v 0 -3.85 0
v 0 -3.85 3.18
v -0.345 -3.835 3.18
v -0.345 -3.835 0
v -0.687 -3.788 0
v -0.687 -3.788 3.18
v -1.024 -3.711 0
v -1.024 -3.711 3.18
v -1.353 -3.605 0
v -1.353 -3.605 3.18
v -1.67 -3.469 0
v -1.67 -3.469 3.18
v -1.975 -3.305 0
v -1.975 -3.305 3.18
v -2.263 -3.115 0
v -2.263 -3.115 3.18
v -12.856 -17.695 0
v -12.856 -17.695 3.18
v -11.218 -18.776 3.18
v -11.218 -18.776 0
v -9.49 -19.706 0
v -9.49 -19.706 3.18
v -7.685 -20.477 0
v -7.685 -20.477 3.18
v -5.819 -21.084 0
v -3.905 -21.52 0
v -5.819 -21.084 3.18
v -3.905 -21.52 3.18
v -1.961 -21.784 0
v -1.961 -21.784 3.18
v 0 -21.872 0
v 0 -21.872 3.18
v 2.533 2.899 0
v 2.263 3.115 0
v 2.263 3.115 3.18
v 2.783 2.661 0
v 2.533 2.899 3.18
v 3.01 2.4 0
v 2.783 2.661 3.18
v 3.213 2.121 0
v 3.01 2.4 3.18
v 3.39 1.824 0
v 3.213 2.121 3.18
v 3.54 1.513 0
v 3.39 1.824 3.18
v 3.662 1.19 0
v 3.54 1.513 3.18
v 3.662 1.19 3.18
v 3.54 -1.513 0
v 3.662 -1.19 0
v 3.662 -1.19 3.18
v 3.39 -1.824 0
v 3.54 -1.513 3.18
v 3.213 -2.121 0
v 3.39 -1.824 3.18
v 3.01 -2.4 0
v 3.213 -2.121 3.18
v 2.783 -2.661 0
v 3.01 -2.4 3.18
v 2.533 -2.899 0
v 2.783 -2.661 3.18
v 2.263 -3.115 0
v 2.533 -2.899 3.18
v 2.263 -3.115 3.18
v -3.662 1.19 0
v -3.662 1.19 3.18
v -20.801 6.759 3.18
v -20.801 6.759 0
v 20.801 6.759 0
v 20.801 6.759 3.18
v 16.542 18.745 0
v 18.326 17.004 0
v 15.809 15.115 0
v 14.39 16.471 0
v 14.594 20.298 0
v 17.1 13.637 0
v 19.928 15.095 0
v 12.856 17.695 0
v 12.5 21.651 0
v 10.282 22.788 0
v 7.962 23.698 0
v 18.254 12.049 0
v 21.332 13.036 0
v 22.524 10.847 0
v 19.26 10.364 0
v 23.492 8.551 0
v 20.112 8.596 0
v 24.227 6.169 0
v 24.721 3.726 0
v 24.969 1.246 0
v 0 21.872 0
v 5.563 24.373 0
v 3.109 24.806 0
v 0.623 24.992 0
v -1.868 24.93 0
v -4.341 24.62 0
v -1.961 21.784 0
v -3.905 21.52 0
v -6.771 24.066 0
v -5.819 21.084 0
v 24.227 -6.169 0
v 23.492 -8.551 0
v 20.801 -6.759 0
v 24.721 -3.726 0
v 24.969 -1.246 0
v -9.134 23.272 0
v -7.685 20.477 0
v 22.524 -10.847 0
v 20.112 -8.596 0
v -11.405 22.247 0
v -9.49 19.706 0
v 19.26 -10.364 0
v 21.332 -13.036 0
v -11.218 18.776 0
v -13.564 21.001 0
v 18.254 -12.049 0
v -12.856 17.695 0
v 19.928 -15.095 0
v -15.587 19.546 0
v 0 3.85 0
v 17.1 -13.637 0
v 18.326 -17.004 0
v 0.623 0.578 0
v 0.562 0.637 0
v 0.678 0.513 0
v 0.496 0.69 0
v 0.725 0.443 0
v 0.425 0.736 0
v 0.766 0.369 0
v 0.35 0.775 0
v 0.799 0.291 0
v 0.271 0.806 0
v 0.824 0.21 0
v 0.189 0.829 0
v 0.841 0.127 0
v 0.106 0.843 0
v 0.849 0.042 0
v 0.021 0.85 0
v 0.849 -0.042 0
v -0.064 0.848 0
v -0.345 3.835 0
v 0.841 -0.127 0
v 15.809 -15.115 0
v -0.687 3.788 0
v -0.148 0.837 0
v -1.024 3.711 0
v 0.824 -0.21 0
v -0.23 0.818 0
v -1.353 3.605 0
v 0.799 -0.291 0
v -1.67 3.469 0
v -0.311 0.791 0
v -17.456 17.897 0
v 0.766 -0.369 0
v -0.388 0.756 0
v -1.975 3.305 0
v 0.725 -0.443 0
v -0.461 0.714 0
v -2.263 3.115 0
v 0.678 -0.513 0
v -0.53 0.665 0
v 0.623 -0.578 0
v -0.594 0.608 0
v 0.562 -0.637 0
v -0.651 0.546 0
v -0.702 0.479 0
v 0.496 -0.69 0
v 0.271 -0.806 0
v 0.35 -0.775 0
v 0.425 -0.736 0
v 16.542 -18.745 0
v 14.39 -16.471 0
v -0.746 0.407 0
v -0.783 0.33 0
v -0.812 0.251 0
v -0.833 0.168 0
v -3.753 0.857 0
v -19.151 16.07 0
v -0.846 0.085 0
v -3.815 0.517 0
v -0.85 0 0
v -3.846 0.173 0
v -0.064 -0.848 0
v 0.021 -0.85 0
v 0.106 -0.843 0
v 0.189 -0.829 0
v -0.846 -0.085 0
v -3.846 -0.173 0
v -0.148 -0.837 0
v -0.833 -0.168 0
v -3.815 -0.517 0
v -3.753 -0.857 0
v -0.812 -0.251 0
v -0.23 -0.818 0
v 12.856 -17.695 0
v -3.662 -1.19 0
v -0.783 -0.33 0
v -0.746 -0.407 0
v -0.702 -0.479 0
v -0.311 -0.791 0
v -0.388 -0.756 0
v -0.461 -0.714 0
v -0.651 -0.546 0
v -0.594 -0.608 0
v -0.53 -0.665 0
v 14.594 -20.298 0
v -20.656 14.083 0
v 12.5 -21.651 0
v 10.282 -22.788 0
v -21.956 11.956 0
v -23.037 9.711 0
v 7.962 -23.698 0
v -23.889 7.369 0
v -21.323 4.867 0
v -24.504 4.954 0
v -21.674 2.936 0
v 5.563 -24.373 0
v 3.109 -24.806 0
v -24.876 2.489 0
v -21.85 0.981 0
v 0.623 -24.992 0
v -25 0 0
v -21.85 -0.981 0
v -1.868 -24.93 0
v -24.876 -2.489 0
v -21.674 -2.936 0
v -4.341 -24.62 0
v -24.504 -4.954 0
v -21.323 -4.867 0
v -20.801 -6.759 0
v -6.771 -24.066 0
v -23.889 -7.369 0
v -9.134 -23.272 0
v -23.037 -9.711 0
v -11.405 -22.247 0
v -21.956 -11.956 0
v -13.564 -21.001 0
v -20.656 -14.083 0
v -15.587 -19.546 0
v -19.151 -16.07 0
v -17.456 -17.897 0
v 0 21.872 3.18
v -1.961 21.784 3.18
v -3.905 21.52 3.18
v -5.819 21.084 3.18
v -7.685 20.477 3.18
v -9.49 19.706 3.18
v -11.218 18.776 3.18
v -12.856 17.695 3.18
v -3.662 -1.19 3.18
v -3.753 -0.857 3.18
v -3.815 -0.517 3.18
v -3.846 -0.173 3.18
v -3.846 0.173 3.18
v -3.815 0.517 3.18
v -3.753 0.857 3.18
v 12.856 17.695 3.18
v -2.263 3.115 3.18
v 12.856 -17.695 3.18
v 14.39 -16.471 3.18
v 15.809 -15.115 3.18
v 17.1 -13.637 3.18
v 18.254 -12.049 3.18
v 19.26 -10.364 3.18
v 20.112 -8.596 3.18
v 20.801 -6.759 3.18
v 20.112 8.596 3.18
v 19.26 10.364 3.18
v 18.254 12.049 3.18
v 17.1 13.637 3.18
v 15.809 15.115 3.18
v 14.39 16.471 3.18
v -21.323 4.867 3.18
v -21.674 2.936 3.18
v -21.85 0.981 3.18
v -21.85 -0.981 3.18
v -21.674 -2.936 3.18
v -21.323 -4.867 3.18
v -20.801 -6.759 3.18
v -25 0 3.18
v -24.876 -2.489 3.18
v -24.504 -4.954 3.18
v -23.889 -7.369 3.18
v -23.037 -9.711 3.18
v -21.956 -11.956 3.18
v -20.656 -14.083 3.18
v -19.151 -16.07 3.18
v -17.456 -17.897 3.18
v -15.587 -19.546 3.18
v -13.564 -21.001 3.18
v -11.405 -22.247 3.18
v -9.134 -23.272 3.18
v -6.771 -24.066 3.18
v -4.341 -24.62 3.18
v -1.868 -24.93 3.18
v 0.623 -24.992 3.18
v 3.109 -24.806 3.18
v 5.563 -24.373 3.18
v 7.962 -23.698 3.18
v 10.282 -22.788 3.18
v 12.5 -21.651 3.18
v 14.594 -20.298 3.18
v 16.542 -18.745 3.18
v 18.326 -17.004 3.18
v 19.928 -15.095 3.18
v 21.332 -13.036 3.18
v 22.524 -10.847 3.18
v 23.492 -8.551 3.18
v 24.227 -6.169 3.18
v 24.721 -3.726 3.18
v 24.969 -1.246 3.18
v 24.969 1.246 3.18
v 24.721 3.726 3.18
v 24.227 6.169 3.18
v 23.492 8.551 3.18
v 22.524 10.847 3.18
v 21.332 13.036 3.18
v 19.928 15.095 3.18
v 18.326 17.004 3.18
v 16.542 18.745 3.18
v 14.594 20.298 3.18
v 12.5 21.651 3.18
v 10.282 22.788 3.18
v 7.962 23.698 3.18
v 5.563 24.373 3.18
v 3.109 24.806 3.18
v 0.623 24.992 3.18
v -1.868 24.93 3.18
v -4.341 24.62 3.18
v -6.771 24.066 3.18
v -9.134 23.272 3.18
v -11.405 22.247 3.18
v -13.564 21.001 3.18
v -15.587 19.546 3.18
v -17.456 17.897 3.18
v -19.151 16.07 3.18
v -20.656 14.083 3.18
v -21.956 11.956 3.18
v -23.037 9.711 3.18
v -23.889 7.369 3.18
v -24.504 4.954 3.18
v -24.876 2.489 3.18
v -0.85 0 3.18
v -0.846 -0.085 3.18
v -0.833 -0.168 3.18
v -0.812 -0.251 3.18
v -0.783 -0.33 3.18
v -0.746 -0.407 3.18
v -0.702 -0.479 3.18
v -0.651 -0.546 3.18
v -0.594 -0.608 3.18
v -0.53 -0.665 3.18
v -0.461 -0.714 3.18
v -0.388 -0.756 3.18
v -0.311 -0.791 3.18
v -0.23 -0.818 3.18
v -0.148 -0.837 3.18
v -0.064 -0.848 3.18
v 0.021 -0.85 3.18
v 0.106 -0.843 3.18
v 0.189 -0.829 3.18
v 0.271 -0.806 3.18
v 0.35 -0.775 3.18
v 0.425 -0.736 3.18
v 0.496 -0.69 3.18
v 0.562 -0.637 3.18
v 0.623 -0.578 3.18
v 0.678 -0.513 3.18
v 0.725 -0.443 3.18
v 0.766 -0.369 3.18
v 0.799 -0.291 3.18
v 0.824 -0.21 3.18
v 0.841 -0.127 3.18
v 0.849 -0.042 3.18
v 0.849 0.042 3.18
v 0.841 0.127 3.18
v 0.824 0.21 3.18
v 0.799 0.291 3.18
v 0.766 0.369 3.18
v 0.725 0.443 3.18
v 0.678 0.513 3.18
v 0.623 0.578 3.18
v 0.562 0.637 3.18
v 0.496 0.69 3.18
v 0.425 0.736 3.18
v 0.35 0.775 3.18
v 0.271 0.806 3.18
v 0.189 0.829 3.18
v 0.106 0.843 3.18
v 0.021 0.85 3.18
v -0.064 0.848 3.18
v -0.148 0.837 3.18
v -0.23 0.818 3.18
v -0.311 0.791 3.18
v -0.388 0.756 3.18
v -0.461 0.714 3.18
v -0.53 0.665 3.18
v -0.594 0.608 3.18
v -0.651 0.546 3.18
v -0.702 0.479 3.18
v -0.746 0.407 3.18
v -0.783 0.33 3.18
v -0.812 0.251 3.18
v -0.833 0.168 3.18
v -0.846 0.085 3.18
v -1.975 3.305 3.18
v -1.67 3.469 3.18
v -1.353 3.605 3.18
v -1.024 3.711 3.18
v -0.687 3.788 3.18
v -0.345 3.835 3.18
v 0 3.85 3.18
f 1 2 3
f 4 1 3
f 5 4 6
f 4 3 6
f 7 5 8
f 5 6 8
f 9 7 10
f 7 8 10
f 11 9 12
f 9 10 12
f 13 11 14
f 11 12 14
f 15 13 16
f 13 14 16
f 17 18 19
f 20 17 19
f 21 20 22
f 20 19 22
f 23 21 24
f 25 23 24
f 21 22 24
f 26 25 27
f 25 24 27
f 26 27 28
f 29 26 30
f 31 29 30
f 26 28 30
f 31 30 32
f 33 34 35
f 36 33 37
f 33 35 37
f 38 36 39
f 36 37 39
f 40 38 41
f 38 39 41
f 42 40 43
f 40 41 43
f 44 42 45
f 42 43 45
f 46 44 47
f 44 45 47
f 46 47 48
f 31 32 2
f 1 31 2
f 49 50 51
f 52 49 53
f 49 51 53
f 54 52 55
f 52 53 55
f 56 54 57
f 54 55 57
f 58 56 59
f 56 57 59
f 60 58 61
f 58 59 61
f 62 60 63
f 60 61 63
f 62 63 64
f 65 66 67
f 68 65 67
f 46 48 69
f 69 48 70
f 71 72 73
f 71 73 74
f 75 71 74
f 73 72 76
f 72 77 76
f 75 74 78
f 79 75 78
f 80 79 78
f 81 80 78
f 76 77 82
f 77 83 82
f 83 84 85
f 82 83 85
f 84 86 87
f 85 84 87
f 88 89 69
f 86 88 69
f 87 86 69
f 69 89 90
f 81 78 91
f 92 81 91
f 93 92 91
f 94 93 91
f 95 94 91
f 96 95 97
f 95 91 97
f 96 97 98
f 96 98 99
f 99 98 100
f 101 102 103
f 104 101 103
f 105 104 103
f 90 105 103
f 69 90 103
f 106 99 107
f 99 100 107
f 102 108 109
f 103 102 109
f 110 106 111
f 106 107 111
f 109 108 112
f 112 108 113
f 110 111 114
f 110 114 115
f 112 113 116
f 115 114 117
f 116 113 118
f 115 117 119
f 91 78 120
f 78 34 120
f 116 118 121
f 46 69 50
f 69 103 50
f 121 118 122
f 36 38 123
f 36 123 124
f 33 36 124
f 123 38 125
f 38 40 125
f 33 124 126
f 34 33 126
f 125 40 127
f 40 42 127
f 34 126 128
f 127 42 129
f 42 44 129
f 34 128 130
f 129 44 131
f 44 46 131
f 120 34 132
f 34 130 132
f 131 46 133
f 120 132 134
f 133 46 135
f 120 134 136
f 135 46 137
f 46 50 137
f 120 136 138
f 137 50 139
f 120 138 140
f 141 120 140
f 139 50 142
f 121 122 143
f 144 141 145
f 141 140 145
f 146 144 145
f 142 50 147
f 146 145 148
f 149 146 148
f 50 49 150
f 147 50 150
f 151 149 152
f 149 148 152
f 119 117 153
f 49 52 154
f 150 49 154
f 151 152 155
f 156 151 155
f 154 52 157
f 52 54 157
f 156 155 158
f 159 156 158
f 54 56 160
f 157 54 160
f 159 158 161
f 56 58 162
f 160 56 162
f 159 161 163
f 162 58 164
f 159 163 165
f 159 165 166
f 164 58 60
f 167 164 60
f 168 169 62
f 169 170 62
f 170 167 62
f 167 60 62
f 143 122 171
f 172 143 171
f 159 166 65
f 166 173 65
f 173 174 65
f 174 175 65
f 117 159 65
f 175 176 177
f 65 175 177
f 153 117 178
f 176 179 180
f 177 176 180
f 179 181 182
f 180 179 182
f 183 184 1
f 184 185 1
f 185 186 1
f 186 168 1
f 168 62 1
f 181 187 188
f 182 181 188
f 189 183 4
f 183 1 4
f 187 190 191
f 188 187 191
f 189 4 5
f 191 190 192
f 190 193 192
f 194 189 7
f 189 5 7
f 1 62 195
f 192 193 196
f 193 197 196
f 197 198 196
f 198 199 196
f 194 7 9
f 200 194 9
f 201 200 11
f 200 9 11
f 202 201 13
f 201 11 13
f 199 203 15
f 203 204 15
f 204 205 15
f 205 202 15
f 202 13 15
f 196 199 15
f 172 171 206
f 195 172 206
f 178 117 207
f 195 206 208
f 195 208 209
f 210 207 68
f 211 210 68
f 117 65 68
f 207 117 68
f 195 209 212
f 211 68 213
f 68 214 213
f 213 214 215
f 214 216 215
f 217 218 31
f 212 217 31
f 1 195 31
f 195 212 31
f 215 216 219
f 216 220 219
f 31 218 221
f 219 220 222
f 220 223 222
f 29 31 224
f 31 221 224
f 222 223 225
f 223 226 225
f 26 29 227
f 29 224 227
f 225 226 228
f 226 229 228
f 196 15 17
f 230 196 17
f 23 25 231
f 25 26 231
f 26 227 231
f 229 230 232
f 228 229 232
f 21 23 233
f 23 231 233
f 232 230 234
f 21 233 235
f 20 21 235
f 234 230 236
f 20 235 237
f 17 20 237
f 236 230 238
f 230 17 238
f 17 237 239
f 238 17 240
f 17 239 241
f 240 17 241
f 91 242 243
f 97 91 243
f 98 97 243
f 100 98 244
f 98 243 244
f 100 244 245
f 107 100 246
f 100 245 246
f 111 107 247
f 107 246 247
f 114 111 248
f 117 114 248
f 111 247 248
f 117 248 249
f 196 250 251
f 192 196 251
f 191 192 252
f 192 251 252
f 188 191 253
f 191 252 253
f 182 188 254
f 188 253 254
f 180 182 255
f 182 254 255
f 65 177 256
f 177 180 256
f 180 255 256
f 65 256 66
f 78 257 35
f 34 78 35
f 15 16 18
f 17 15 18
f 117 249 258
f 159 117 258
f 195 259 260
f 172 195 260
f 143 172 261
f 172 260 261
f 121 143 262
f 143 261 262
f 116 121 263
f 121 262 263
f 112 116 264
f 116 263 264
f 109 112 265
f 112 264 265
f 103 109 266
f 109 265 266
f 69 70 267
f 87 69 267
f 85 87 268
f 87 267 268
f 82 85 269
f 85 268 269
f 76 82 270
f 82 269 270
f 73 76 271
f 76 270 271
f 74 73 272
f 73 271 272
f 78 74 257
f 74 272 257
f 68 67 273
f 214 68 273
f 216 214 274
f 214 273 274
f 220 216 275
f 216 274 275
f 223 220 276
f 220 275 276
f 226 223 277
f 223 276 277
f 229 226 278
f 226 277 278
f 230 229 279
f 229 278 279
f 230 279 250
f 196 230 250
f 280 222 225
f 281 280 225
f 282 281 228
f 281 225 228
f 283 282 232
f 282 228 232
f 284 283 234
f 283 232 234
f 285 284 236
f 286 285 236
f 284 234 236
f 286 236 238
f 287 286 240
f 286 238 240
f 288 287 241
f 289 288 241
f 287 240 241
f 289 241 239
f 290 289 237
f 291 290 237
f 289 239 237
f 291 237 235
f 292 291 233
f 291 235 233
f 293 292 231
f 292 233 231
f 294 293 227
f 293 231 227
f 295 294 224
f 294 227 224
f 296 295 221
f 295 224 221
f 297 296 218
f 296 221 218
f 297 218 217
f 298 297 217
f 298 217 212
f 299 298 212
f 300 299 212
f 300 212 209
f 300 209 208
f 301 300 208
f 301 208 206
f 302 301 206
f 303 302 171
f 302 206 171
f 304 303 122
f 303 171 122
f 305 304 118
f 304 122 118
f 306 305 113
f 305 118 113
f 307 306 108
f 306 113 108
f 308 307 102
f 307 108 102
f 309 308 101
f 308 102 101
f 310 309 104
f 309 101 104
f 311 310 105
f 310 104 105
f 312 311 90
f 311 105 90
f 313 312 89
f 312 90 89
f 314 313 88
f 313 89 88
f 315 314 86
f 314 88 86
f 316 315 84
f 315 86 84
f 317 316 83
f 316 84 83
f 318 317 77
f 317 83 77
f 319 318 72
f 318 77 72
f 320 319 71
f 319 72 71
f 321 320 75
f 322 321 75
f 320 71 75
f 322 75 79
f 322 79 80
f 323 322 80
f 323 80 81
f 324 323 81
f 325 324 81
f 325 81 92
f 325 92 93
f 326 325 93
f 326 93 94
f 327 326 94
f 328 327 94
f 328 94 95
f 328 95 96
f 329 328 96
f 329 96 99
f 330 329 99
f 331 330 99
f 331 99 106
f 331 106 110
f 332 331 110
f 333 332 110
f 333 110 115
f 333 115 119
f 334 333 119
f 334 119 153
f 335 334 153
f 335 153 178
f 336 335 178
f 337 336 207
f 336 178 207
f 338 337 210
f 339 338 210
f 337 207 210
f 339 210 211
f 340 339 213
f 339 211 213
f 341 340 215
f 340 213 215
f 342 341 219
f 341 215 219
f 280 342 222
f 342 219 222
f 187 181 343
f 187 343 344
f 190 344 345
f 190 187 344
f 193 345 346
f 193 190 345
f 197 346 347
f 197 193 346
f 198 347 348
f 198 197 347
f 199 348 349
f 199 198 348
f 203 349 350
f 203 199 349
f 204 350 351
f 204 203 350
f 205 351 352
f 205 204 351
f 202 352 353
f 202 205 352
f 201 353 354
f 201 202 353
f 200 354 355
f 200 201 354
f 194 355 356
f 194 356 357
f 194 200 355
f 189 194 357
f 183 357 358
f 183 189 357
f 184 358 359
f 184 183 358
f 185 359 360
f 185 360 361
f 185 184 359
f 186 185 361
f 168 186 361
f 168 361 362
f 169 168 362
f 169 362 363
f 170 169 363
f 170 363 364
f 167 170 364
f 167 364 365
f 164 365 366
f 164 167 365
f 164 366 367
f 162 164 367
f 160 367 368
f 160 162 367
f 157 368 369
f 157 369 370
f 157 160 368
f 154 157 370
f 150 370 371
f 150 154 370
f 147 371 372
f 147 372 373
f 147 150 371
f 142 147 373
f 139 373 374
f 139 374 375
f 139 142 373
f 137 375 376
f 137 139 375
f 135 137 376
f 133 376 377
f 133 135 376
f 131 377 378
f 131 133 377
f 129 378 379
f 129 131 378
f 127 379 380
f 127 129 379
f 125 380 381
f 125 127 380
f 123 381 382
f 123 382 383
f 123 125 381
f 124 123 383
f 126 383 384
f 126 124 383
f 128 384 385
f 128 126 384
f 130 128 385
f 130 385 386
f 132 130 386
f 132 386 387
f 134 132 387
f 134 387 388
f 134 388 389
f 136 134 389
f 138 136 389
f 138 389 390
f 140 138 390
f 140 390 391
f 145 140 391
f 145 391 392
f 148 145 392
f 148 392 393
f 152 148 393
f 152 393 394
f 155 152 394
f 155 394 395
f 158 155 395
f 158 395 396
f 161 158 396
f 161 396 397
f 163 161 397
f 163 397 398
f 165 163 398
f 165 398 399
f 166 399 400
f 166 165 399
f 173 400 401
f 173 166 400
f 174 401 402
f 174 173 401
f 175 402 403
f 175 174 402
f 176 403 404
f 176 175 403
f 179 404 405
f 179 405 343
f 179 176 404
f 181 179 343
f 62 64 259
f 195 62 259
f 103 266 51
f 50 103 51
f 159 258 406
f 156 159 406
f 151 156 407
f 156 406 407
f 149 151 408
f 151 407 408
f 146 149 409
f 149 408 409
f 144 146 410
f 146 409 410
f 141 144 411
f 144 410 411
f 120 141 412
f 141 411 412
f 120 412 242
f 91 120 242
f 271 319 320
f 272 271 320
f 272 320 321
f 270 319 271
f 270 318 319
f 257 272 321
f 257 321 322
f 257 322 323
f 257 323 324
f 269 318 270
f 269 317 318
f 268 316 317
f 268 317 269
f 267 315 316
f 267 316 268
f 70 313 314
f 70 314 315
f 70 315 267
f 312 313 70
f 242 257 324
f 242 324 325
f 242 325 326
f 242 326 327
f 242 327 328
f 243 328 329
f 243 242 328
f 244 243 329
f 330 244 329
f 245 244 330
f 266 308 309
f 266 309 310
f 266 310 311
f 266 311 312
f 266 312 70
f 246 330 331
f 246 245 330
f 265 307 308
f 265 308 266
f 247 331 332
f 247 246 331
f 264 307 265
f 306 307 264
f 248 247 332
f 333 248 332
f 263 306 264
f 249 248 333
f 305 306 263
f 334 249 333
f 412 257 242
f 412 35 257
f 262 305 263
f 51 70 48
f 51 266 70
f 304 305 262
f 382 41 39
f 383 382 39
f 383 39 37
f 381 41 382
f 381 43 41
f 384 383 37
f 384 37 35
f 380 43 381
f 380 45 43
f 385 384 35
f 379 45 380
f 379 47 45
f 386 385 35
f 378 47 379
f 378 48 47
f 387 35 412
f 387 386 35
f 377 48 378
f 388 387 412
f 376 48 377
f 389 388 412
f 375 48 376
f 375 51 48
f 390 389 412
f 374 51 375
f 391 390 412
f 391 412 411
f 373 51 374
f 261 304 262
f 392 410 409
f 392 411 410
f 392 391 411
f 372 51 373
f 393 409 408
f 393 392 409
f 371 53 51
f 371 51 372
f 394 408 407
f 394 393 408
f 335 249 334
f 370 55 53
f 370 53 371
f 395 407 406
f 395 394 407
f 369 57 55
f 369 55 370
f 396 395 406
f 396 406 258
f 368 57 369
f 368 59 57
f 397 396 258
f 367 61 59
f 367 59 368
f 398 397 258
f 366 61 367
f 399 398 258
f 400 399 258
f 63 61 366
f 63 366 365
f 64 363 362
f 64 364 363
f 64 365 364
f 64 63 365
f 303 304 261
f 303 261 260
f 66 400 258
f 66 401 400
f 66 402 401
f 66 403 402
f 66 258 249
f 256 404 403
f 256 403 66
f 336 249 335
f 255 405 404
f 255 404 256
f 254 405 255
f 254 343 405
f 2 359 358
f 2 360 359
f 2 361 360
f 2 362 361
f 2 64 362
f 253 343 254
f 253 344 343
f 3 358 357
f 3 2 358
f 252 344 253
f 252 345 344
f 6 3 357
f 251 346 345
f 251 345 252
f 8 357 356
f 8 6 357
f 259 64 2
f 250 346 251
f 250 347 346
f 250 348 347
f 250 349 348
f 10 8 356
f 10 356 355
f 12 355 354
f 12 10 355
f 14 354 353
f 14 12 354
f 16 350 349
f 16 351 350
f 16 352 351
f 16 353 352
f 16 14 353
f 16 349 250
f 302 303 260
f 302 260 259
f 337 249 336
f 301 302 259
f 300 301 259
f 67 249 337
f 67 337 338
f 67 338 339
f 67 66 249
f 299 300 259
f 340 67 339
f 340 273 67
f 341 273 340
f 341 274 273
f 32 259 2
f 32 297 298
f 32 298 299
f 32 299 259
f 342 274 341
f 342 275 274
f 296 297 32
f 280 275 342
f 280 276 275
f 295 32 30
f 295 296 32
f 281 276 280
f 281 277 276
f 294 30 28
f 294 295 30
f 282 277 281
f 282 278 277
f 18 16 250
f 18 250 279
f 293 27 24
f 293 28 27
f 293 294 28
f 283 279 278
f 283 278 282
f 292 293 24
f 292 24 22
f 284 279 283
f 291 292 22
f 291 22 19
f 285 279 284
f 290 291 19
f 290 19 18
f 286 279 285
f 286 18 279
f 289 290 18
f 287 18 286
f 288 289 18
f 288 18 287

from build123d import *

# Parameters (mm, degrees)
SKETCH1_R           = 25
SKETCH1_R_2         = 0.85
BOSS_EXTRUDE1_DEPTH = 3.18
CUT_EXTRUDE1_DEPTH  = 36.498061919


with BuildPart() as part:
    # Sketch1 → Boss-Extrude1 (new body)
    with BuildSketch(Plane.XY):
        with Locations(Location((0, 0, 0), (0, 0, 180))):
            Circle(SKETCH1_R)
        with Locations(Location((0, 0, 0), (0, 0, 180))):
            Circle(SKETCH1_R_2, mode=Mode.SUBTRACT)
    extrude(amount=BOSS_EXTRUDE1_DEPTH)

    # Sketch2 → Cut-Extrude1 (cut, through all)
    with BuildSketch(Plane.XY.offset(3.18)):
        with BuildLine():
            ThreePointArc((-2.262973221, 3.114715428), (-1.189715428, 3.661567588), (0, 3.85))
            Line((0, 3.85), (0, 21.87181707))
            ThreePointArc((0, 21.87181707), (-6.758763172, 20.801334147), (-12.855931514, 17.694671707))
            Line((-12.855931514, 17.694671707), (-2.262973221, 3.114715428))
        make_face()
        with BuildLine():
            Line((12.855931514, 17.694671707), (2.262973221, 3.114715428))
            ThreePointArc((2.262973221, 3.114715428), (3.114715428, 2.262973221), (3.661567588, 1.189715428))
            Line((3.661567588, 1.189715428), (20.801334147, 6.758763172))
            ThreePointArc((20.801334147, 6.758763172), (17.694671707, 12.855931514), (12.855931514, 17.694671707))
        make_face()
        with BuildLine():
            ThreePointArc((-3.661567588, -1.189715428), (-3.85, 0), (-3.661567588, 1.189715428))
            Line((-3.661567588, 1.189715428), (-20.801334147, 6.758763172))
            ThreePointArc((-20.801334147, 6.758763172), (-21.87181707, 0), (-20.801334147, -6.758763172))
            Line((-20.801334147, -6.758763172), (-3.661567588, -1.189715428))
        make_face()
        with BuildLine():
            Line((20.801334147, -6.758763172), (3.661567588, -1.189715428))
            ThreePointArc((3.661567588, -1.189715428), (3.114715428, -2.262973221), (2.262973221, -3.114715428))
            Line((2.262973221, -3.114715428), (12.855931514, -17.694671707))
            ThreePointArc((12.855931514, -17.694671707), (17.694671707, -12.855931514), (20.801334147, -6.758763172))
        make_face()
        with BuildLine():
            ThreePointArc((0, -3.85), (-1.189715428, -3.661567588), (-2.262973221, -3.114715428))
            Line((-2.262973221, -3.114715428), (-12.855931514, -17.694671707))
            ThreePointArc((-12.855931514, -17.694671707), (-6.758763172, -20.801334147), (0, -21.87181707))
            Line((0, -21.87181707), (0, -3.85))
        make_face()
    extrude(amount=-CUT_EXTRUDE1_DEPTH, mode=Mode.SUBTRACT)


solid = part.part
